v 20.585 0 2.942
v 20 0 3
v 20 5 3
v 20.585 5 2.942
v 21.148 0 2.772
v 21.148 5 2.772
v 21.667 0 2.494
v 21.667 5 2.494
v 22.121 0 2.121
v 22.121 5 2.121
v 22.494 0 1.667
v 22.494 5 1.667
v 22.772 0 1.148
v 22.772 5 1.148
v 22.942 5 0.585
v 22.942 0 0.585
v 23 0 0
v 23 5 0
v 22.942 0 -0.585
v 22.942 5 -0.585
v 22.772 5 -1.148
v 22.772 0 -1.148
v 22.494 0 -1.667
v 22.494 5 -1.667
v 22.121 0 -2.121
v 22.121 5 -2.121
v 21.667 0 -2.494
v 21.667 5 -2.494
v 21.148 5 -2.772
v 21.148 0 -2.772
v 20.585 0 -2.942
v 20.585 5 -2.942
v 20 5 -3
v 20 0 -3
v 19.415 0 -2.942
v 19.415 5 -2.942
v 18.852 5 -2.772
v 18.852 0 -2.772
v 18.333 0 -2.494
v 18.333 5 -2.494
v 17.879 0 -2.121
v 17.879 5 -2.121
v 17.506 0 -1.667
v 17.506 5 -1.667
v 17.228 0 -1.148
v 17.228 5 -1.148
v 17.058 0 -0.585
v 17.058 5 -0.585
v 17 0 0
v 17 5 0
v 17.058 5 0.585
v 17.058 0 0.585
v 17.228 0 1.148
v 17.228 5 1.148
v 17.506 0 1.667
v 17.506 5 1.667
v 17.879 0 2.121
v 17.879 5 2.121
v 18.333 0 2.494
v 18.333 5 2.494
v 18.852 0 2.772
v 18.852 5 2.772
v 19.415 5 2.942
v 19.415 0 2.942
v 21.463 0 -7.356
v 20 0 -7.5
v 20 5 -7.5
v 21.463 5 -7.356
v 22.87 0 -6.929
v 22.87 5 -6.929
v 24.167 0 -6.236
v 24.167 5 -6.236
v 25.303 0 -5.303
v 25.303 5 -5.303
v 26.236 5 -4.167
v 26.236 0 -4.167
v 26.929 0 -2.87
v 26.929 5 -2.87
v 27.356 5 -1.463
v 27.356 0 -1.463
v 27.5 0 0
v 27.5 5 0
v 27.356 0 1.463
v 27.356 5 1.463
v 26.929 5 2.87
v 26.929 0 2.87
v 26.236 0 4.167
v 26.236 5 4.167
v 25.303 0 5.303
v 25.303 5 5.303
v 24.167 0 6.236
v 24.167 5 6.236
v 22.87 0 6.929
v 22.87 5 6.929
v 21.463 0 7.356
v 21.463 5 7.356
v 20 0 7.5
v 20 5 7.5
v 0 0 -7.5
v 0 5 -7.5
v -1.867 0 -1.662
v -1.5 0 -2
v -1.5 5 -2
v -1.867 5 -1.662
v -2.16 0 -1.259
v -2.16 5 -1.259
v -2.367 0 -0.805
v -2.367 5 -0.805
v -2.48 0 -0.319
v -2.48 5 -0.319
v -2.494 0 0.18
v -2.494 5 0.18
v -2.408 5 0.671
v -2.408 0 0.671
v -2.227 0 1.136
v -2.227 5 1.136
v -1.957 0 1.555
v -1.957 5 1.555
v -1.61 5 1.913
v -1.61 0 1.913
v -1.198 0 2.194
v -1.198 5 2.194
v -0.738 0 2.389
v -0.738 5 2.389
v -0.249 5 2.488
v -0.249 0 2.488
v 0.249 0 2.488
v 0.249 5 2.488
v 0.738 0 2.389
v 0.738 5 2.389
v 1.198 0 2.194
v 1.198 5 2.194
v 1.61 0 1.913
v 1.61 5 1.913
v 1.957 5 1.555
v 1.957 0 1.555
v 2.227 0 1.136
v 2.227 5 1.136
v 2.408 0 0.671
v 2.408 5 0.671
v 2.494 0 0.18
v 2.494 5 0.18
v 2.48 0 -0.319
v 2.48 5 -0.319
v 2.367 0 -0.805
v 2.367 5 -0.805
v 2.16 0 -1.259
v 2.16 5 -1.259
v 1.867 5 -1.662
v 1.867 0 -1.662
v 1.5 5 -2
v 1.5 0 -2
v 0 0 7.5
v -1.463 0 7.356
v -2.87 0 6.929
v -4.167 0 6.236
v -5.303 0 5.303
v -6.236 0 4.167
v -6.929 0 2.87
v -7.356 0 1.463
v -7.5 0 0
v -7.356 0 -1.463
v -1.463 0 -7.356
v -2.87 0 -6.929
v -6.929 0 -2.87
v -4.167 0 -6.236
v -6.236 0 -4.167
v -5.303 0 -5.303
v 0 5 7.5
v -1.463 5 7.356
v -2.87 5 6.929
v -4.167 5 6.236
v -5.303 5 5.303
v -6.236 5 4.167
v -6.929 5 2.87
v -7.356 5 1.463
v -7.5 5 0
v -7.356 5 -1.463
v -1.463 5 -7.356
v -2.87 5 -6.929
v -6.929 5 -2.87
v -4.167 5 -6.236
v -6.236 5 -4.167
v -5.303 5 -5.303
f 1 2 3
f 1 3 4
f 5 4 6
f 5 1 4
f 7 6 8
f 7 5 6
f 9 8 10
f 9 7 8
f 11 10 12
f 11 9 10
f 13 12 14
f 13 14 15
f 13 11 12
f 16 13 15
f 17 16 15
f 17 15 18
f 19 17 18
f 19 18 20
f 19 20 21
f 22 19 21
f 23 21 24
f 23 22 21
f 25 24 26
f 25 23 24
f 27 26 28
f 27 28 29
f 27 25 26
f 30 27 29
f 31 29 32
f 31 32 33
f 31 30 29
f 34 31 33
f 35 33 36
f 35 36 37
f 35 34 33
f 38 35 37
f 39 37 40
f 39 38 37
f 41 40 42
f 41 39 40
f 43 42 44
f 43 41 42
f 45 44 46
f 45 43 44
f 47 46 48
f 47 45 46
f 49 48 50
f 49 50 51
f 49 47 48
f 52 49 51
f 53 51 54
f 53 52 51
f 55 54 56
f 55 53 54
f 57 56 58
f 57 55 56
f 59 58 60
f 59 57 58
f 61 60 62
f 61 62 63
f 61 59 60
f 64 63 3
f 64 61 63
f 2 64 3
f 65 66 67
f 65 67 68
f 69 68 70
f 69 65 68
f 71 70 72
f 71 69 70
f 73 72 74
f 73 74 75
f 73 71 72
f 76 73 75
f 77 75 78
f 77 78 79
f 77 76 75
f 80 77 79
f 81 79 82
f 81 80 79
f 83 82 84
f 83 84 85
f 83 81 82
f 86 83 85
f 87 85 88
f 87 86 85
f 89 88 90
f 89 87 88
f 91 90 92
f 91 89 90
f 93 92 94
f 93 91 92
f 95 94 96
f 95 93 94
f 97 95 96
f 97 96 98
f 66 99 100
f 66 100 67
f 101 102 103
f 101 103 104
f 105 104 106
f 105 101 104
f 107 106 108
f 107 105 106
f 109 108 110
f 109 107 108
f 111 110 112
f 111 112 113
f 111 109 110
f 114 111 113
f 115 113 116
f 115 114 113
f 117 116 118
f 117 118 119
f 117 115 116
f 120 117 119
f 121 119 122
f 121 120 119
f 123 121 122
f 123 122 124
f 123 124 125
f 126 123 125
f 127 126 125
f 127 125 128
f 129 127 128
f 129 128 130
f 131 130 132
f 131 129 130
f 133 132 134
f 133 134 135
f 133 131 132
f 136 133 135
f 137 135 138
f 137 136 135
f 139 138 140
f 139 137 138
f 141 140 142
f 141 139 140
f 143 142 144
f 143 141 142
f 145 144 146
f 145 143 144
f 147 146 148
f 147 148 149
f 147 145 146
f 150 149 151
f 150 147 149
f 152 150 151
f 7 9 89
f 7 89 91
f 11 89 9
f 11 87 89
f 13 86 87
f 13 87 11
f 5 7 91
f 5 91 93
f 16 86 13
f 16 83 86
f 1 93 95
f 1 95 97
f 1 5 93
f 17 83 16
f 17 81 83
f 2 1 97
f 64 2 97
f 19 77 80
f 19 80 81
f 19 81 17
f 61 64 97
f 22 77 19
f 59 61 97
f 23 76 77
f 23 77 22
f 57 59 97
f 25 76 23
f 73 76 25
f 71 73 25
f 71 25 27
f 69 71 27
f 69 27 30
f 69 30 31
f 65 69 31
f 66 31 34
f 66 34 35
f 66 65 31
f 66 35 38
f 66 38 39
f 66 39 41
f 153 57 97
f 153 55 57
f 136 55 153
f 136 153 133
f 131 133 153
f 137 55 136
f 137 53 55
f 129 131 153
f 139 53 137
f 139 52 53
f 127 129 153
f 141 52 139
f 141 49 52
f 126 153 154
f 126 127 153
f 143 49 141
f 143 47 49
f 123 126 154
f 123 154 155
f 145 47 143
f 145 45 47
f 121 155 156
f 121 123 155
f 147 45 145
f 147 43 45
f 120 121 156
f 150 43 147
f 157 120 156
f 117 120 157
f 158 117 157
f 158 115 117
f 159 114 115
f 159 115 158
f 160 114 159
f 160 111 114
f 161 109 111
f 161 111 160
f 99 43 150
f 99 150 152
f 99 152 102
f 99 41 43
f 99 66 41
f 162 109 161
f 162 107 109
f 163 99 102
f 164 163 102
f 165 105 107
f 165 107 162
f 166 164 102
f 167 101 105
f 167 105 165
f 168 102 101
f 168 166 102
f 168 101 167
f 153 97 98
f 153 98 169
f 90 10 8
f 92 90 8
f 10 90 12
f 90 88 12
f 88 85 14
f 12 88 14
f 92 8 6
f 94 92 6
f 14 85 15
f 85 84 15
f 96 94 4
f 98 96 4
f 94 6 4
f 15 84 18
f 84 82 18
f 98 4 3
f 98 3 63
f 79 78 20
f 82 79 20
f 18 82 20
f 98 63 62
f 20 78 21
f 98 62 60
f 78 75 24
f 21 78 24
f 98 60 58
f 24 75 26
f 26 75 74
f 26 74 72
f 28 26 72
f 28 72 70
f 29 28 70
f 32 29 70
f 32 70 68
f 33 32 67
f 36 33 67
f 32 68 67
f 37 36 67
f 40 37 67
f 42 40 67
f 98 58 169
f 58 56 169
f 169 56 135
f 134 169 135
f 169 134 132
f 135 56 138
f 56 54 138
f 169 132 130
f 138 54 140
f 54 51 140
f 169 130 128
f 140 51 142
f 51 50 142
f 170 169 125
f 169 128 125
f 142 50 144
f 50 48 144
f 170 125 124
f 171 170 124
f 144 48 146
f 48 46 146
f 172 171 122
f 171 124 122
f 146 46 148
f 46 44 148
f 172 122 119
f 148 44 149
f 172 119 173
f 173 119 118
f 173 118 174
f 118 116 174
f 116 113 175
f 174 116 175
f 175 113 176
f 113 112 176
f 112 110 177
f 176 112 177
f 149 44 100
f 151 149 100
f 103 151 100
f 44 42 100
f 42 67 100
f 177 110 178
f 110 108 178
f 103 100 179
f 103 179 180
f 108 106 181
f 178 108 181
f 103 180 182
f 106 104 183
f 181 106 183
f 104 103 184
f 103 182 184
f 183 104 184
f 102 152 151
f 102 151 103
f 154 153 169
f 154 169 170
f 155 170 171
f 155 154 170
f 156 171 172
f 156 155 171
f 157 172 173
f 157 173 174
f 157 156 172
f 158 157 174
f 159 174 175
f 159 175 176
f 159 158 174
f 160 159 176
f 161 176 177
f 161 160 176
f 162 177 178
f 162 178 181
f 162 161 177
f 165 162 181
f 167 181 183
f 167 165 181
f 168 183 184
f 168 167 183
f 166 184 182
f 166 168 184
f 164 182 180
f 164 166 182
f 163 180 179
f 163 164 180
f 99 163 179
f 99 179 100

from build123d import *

# Parameters (mm, degrees)
SKETCH1_R           = 3
BOSS_EXTRUDE1_DEPTH = 5


with BuildPart() as part:
    # Sketch1 → Boss-Extrude1 (new body)
    with BuildSketch(Plane(origin=(0, 0, 0), x_dir=(1, 0, 0), z_dir=(0, 1, 0))):
        with BuildLine():
            Line((0, 7.5), (20, 7.5))
            ThreePointArc((20, 7.5), (27.5, 0), (20, -7.5))
            Line((20, -7.5), (0, -7.5))
            ThreePointArc((0, -7.5), (-7.5, 0), (0, 7.5))
        make_face()
        with Locations(Location((20, 0, 0), (0, 0, 270))):
            Circle(SKETCH1_R, mode=Mode.SUBTRACT)
        with BuildLine():
            Line((1.5, 2), (-1.5, 2))
            ThreePointArc((-1.5, 2), (0, -2.5), (1.5, 2))
        make_face(mode=Mode.SUBTRACT)
    extrude(amount=BOSS_EXTRUDE1_DEPTH)


solid = part.part
